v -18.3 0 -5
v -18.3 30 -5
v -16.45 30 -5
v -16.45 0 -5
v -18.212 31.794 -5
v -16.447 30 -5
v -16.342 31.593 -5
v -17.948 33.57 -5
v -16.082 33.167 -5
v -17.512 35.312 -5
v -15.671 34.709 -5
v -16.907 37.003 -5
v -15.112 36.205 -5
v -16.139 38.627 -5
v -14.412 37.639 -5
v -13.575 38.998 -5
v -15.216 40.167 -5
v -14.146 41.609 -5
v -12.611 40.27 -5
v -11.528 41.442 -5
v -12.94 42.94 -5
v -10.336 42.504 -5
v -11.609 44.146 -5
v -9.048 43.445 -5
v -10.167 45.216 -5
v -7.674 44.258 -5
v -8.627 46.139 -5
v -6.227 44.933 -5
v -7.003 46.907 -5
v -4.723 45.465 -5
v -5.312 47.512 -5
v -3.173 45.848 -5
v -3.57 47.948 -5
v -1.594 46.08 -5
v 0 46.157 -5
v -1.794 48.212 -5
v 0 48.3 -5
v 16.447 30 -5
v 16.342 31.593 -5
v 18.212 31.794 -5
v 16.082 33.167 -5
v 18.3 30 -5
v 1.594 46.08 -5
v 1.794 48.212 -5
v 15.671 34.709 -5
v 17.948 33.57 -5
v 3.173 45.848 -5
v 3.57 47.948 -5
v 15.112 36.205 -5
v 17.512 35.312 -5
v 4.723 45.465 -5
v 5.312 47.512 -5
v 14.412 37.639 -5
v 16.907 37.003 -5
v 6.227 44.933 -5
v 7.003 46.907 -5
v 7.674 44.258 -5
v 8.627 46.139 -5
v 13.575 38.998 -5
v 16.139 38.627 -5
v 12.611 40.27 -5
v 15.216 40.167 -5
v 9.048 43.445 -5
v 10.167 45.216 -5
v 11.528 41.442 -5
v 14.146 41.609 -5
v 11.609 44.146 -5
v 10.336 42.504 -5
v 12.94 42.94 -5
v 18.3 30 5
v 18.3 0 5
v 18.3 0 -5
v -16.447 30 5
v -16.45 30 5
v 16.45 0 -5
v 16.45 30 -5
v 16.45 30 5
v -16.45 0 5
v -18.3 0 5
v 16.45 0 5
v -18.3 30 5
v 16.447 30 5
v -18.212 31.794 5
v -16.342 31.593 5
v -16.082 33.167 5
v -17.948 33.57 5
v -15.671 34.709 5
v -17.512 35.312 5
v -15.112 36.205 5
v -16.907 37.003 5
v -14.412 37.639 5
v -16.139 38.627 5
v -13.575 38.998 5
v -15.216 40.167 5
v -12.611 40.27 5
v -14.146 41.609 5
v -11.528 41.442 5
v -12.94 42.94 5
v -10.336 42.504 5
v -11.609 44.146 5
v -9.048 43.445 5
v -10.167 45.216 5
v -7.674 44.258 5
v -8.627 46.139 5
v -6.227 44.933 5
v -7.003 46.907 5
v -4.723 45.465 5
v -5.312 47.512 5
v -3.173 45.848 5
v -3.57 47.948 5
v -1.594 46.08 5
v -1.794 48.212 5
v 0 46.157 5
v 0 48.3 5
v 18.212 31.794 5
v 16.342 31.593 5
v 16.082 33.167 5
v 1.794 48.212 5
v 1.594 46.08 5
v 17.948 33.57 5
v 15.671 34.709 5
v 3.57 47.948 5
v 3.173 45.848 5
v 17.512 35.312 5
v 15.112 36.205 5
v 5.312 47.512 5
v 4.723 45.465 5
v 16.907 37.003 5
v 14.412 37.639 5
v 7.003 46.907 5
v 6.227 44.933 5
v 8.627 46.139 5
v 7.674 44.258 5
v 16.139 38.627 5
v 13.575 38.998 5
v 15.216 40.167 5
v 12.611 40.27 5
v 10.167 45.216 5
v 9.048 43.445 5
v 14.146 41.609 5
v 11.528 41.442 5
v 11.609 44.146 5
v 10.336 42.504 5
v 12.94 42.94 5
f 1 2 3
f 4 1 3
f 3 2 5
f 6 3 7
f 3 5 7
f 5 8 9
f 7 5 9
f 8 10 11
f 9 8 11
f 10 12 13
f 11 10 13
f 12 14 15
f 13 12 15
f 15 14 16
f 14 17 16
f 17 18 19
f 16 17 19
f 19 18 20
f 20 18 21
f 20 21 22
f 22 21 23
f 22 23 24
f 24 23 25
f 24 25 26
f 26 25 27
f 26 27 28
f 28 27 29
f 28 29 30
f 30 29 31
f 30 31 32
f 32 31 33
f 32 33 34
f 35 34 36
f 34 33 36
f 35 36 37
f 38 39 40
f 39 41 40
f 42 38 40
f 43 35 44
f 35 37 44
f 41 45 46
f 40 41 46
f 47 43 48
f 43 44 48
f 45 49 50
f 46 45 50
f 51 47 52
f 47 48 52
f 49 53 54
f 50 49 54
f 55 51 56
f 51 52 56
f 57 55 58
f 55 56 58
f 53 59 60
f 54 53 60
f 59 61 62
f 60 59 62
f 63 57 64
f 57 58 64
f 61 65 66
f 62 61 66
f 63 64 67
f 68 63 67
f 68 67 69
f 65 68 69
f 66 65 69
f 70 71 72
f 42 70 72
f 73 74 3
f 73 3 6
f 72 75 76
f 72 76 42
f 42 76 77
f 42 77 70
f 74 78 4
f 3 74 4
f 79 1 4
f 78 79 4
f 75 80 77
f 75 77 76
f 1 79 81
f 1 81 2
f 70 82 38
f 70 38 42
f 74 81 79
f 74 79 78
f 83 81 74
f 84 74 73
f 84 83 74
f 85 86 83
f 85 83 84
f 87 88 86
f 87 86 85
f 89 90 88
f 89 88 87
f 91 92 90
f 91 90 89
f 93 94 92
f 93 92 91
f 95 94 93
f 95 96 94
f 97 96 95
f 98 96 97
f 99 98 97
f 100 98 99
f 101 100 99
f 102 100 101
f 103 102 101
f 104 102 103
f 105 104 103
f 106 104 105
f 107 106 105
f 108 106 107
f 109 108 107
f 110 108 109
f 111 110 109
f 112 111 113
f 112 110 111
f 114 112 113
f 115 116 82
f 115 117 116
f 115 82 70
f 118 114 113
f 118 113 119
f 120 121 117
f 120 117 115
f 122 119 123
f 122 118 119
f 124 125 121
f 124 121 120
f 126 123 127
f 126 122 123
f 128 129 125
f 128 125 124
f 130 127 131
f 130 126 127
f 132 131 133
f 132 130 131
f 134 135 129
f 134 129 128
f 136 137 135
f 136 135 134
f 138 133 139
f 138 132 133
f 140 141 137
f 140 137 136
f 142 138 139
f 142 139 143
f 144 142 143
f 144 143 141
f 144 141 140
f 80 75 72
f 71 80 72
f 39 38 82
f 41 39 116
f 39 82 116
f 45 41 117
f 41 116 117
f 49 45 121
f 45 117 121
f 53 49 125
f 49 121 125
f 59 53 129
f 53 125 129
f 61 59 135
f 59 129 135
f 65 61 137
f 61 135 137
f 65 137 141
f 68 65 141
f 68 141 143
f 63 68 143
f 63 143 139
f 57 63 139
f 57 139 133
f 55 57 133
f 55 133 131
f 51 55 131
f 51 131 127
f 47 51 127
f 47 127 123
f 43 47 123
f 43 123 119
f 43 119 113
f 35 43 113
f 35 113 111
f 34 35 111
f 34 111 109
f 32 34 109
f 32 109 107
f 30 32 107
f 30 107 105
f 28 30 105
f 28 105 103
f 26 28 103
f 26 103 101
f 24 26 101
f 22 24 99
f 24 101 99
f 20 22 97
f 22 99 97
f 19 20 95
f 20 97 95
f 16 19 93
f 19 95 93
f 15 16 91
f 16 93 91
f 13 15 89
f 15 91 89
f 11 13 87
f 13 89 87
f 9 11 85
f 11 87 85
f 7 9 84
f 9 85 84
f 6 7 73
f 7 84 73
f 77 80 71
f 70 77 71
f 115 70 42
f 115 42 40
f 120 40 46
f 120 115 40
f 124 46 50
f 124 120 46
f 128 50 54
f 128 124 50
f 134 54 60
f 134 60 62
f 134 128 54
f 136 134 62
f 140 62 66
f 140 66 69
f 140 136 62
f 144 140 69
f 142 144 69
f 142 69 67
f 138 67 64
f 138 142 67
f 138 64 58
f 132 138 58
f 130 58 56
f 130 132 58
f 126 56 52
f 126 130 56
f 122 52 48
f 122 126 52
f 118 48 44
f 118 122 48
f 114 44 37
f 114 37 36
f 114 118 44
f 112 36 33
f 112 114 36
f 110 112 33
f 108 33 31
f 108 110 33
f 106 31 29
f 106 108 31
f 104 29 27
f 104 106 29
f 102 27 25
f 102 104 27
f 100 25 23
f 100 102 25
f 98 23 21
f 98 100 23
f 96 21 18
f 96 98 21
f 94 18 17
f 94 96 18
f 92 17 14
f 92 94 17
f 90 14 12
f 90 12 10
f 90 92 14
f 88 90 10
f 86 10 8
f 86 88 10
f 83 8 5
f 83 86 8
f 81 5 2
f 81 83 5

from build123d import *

# Parameters (mm, degrees)
SKETCH1_W           = 36.6
SKETCH1_H           = 10
BOSS_EXTRUDE1_DEPTH = 30
SKETCH2_W           = 32.9
SKETCH2_H           = 10
CUT_EXTRUDE1_DEPTH  = 36.494929215
BOSS_EXTRUDE3_DEPTH = 10
CUT_EXTRUDE2_DEPTH  = 17.038


with BuildPart() as part:
    # Sketch1 → Boss-Extrude1 (new body)
    with BuildSketch(Plane(origin=(0, 0, 0), x_dir=(1, 0, 0), z_dir=(0, 1, 0))):
        Rectangle(SKETCH1_W, SKETCH1_H)
    extrude(amount=BOSS_EXTRUDE1_DEPTH)

    # Sketch2 → Cut-Extrude1 (cut, through all)
    with BuildSketch(Plane(origin=(0, 0, 0), x_dir=(1, 0, 0), z_dir=(0, 1, 0))):
        Rectangle(SKETCH2_W, SKETCH2_H)
    extrude(amount=CUT_EXTRUDE1_DEPTH, mode=Mode.SUBTRACT)


with BuildPart() as cut_extrude1_piece_1:
    # of the separate pieces the step leaves, piece 1, a body of its own (cut_extrude1_pieces)
    add(part.part.solids().sort_by_distance((16.45, 0, -5))[0])


with BuildPart() as cut_extrude1_piece_2:
    # of the separate pieces the step leaves, piece 2, a body of its own (cut_extrude1_pieces)
    add(part.part.solids().sort_by_distance((-18.3, 0, -5))[0])

    # Sketch3 → Boss-Extrude3 (add)
    with BuildSketch(Plane.XY.offset(5)):
        with BuildLine():
            Line((-18.3, 30), (18.3, 30))
            ThreePointArc((18.3, 30), (0, 48.3), (-18.3, 30))
        make_face()
    extrude(amount=-BOSS_EXTRUDE3_DEPTH)

    # Sketch4 → Cut-Extrude2 (cut)
    with BuildSketch(Plane.XY.offset(5)):
        with BuildLine():
            Line((-16.45, 29.706969737), (16.45, 29.706969737))
            ThreePointArc((16.45, 29.706969737), (0, 46.156969737), (-16.45, 29.706969737))
        make_face()
    extrude(amount=-CUT_EXTRUDE2_DEPTH, mode=Mode.SUBTRACT)


solid = Compound([cut_extrude1_piece_1.part, cut_extrude1_piece_2.part])
